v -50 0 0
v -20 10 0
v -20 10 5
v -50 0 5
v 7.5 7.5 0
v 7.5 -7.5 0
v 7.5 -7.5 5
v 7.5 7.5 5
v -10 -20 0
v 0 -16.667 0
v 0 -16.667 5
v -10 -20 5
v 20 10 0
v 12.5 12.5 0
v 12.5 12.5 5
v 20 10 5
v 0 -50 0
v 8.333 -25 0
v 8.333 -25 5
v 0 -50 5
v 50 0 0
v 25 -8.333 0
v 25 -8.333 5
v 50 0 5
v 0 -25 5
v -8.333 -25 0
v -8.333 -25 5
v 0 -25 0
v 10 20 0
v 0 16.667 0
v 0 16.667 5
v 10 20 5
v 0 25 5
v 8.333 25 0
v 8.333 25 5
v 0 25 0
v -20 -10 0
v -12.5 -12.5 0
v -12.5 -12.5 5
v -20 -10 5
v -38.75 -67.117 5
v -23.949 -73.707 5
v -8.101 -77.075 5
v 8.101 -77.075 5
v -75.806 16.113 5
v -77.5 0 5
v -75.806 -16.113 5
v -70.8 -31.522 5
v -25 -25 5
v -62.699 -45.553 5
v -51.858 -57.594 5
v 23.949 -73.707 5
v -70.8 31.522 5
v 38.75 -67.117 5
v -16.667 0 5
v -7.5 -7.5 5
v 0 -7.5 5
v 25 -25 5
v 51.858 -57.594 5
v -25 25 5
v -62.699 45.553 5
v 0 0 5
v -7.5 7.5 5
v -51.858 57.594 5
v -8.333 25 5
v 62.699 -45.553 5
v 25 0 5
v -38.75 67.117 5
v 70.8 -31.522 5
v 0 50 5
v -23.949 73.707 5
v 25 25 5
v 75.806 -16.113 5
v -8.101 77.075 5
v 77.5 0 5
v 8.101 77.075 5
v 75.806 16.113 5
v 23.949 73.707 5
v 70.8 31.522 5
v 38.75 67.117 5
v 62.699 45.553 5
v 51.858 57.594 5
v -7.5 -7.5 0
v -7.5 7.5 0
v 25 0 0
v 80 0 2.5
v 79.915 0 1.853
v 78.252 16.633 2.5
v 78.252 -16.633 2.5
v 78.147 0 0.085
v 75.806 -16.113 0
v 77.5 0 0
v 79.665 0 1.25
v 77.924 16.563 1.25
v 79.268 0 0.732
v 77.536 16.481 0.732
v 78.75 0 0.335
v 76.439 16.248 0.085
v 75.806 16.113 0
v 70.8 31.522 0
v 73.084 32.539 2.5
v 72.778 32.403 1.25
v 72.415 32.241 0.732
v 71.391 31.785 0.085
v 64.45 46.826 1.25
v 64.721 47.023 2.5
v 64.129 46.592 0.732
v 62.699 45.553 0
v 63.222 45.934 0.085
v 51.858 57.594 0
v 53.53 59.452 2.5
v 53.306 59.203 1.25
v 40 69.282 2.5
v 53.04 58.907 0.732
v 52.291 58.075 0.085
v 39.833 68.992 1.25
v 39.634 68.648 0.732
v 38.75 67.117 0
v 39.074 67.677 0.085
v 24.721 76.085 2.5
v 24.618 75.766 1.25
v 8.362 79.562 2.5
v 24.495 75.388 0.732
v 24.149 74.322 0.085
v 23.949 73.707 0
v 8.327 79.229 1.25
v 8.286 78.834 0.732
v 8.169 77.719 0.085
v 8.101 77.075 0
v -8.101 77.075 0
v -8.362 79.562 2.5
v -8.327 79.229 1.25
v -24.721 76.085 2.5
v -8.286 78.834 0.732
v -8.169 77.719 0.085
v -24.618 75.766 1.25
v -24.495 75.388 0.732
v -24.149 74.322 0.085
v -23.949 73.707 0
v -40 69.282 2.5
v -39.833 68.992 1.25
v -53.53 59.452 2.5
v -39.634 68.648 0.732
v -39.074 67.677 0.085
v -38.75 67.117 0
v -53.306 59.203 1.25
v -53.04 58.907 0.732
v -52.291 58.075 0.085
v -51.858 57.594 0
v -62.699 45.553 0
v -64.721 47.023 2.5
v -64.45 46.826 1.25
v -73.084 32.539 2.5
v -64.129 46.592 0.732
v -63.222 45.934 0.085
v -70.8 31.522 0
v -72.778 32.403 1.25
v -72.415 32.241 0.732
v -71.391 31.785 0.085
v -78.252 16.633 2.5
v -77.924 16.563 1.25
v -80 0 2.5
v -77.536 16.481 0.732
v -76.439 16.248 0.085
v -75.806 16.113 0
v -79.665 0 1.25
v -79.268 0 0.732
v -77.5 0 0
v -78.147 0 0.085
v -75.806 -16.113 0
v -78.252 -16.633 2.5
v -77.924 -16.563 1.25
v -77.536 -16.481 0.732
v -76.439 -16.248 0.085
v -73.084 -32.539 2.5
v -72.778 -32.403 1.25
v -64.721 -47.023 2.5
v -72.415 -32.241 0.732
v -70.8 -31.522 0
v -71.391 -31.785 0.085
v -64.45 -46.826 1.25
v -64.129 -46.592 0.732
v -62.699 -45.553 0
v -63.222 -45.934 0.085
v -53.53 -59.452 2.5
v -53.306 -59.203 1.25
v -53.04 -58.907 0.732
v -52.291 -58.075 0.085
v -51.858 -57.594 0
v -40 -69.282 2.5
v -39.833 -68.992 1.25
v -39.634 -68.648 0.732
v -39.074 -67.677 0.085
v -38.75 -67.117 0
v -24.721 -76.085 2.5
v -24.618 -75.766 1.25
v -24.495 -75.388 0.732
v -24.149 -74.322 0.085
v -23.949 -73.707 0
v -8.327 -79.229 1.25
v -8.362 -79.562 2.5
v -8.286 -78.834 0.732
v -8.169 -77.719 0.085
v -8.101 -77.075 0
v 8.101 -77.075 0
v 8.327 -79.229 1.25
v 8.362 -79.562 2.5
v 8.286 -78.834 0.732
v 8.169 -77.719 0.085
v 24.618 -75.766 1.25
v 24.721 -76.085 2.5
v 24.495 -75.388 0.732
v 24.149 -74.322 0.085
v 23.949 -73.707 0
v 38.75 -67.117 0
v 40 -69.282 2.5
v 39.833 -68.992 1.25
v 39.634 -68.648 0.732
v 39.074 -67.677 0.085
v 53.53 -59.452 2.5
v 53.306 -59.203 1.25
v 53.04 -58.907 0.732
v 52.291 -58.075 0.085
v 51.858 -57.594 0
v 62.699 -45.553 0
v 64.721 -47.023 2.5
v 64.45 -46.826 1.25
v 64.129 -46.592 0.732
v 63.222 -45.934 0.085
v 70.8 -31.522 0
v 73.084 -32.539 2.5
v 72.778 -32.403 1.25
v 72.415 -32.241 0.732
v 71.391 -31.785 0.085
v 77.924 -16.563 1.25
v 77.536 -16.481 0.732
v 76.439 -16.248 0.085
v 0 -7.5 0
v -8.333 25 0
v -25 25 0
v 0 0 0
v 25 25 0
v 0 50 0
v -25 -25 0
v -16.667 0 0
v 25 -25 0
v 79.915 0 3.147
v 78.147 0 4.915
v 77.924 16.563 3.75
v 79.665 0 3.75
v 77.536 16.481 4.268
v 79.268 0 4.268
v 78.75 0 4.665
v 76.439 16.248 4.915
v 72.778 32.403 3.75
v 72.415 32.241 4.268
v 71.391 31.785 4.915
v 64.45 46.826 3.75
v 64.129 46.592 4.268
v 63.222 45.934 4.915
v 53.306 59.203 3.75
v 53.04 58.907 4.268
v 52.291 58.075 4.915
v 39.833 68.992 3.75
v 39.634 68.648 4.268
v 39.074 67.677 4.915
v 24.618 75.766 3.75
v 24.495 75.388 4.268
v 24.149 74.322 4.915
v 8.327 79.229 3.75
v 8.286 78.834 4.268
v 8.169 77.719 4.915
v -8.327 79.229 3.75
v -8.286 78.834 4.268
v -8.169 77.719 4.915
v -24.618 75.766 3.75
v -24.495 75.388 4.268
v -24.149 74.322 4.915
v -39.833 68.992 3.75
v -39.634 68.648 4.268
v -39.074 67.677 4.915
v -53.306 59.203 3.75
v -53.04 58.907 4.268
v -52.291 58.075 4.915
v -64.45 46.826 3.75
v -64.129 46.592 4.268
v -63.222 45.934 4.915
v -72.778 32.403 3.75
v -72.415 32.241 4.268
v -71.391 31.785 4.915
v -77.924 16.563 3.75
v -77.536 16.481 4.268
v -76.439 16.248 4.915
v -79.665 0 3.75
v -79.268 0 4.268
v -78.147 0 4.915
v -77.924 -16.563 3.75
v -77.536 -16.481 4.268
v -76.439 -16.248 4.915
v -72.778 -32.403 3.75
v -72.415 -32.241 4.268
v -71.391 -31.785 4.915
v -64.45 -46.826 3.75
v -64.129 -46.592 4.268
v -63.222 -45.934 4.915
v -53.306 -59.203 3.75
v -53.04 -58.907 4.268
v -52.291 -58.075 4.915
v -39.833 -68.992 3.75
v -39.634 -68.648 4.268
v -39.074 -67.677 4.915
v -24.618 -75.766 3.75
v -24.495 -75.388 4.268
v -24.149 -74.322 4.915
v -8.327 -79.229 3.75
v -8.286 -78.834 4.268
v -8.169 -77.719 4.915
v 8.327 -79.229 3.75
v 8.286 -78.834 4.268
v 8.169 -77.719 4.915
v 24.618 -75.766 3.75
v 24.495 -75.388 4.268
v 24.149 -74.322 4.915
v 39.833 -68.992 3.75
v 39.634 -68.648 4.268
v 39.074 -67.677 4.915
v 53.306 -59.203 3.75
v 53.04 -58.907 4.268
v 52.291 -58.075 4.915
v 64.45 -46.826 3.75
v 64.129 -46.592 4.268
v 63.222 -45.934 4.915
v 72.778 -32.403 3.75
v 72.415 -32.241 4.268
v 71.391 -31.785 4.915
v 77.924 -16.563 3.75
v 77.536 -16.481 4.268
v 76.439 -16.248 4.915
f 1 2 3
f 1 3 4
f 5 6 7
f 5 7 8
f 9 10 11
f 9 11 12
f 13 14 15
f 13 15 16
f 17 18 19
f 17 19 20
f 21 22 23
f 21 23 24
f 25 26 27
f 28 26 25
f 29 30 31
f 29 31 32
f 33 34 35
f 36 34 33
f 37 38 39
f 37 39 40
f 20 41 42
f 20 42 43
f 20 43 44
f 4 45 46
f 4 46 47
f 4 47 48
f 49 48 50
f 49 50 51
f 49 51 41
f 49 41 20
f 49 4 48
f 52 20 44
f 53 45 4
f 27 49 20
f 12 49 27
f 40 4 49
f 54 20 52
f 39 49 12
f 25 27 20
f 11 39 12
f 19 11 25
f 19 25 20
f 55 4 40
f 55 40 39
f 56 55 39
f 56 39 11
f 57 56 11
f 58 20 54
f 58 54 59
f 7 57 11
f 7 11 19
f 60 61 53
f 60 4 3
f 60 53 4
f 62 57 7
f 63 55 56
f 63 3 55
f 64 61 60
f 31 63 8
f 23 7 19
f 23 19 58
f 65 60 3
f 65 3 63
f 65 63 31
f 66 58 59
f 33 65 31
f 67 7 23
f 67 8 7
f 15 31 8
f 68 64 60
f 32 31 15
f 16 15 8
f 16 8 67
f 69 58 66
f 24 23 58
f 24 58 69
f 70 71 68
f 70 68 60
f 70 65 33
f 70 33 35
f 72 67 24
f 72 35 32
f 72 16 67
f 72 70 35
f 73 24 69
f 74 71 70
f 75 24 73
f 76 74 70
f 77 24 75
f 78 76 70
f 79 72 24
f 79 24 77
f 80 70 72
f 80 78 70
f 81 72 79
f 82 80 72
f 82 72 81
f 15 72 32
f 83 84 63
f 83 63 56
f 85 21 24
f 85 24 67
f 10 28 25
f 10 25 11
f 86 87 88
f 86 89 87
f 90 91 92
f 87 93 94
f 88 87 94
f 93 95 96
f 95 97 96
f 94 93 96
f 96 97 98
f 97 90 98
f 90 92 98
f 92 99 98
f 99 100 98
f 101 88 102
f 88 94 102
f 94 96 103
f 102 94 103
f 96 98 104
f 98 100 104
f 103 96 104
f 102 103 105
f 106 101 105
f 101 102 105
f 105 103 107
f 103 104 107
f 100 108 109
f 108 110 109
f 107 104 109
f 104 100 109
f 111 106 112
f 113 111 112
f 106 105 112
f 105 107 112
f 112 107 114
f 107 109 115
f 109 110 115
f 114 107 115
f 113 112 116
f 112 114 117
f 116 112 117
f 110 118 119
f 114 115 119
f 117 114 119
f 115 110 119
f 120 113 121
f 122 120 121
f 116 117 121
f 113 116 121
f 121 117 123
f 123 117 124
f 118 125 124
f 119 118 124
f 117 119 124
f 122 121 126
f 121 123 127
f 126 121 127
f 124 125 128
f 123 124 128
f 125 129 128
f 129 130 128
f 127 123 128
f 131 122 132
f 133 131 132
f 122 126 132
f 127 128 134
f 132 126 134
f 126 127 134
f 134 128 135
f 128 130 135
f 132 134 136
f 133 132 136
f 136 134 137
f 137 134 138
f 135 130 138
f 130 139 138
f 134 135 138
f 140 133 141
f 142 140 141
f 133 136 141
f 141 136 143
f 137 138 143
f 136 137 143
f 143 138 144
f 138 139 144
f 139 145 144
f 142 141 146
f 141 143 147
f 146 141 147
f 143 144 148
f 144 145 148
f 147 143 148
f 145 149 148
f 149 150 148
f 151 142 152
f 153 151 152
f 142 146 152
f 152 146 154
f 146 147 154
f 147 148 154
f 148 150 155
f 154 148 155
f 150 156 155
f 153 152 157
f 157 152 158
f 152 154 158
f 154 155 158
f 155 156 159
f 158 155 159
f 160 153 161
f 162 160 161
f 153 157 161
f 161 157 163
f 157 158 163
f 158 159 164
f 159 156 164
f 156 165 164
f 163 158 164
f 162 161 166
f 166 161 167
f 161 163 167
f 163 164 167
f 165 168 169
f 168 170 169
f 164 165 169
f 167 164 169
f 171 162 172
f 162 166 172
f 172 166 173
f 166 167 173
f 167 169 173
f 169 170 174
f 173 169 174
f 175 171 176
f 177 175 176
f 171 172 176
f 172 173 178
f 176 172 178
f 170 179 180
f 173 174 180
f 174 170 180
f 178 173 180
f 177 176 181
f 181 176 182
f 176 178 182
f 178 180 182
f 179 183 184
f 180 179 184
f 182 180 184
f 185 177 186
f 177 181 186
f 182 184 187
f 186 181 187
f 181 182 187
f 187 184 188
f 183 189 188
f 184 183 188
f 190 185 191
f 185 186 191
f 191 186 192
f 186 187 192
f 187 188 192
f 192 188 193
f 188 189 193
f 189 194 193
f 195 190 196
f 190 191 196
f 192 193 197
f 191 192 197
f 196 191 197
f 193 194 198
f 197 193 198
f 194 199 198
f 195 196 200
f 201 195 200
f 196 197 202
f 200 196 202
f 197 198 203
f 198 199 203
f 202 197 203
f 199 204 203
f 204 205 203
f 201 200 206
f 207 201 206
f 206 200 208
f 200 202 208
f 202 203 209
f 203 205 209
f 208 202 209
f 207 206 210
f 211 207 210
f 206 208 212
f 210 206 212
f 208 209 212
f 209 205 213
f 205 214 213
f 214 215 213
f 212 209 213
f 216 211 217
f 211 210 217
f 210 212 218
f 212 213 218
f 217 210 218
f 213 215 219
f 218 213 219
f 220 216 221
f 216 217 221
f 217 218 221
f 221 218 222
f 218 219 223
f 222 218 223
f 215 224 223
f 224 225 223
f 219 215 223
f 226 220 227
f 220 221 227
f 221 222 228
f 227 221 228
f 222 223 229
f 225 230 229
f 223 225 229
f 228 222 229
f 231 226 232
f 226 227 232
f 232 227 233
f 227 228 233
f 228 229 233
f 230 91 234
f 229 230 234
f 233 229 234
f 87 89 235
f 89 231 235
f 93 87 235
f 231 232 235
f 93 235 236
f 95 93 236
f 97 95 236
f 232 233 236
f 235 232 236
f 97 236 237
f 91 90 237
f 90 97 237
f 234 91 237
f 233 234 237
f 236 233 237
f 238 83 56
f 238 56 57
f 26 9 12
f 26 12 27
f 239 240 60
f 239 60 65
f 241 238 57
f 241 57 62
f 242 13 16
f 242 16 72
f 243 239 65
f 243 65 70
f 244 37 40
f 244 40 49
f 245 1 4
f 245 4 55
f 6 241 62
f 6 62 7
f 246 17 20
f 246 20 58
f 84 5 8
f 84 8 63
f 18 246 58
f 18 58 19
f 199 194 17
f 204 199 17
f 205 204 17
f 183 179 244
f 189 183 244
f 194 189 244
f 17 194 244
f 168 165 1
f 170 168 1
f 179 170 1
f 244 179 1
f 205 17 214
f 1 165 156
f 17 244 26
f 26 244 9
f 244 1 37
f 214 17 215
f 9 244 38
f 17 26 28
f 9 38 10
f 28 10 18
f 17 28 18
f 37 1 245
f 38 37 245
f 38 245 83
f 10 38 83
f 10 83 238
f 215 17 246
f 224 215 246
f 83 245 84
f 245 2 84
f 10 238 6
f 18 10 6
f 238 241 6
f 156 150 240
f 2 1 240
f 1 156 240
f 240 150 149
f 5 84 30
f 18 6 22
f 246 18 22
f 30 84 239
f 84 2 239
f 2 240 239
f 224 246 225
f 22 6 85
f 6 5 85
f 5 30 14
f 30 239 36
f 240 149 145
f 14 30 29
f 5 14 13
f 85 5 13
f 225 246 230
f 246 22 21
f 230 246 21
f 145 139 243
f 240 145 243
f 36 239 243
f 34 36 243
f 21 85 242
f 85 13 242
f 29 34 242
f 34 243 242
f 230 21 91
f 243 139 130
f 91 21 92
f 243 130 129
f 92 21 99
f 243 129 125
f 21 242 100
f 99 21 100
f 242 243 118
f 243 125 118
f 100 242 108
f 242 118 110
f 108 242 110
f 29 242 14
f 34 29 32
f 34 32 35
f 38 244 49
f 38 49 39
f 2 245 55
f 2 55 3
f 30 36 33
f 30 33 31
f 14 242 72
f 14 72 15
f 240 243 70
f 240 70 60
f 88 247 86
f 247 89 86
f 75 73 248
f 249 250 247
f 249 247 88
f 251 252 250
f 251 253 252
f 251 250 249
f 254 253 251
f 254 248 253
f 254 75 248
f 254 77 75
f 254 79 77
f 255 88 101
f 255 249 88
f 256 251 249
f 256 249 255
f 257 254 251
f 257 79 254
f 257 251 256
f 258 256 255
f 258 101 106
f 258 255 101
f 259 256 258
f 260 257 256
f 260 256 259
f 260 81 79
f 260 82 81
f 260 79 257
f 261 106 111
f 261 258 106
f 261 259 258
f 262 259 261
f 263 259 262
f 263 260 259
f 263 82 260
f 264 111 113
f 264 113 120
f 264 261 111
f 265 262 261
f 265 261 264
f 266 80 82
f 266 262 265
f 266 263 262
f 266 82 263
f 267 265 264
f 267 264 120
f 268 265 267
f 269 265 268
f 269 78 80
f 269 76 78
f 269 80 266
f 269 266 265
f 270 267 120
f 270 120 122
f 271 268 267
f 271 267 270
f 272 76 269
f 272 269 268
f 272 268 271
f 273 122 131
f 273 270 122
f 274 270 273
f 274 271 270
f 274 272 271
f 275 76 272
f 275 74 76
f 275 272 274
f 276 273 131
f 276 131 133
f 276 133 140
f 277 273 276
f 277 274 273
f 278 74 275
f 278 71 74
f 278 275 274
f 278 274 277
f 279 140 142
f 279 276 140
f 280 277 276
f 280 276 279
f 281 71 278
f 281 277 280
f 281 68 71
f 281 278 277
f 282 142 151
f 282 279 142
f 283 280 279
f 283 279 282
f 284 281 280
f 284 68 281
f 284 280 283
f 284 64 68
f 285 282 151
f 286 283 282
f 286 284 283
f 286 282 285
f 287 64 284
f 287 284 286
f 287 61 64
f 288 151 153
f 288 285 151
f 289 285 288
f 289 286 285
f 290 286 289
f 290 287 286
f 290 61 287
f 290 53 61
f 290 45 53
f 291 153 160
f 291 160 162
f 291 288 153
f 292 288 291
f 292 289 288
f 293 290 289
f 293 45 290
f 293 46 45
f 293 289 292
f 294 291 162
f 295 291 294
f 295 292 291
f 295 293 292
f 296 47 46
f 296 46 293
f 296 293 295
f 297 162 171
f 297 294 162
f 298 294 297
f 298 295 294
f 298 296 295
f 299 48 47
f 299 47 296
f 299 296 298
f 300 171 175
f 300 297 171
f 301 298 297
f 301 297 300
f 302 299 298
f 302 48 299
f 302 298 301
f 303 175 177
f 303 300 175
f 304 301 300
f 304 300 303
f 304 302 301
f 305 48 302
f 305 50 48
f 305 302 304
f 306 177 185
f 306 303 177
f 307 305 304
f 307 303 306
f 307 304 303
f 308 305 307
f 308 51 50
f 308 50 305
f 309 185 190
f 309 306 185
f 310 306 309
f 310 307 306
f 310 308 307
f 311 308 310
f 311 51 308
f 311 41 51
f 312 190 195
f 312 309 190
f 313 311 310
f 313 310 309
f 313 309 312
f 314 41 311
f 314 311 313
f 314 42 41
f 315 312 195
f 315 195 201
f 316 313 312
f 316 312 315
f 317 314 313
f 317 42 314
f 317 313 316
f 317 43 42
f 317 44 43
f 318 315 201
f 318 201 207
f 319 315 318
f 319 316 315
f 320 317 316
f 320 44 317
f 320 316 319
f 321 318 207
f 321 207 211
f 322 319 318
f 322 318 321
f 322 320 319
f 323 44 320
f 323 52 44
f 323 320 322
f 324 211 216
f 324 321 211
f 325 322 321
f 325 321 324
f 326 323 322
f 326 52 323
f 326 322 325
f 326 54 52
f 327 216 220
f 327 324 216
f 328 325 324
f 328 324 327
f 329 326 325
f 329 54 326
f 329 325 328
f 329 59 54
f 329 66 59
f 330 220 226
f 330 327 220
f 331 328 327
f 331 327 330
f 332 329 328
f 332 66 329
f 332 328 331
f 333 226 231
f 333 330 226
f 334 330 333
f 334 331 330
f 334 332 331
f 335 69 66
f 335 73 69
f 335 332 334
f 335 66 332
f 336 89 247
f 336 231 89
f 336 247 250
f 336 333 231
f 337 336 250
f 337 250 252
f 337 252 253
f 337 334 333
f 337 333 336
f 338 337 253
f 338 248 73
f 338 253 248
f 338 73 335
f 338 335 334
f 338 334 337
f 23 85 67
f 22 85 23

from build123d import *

# Parameters (mm, degrees)
F0_R     = 80
F1_DEPTH = 5
F3_DEPTH = 10
F4_R     = 2.49999
F5_DEPTH = 25


# Not quite as in the source:
# - a fillet or chamfer is up to 0.001 mm smaller than in the source, because OpenCascade refuses the exact size


with BuildPart() as f1:
    # F0 (on Top) → F1 (new body)
    with BuildSketch(Plane.XY):
        Circle(F0_R)
    extrude(amount=F1_DEPTH)

    # F2 (on Top) → F3 (cut)
    with BuildSketch(Plane.XY):
        Polygon((0, 50), (-25, 25), (-8.3333333333, 25), align=None)
        Polygon((-50, 0), (-16.6666666667, 0), (-20, 10), align=None)
        Polygon((-25, -25), (-12.5, -12.5), (-20, -10), align=None)
        Polygon((0, -25), (0, -16.6666666667), (-10, -20), (-8.3333333333, -25), align=None)
        Polygon((0, -50), (25, -25), (8.3333333333, -25), align=None)
        Polygon((0, 25), (0, 16.6666666667), (10, 20), (8.3333333333, 25), align=None)
        Polygon((25, 25), (12.5, 12.5), (20, 10), align=None)
        Polygon((50, 0), (25, 0), (25, -8.3333333333), align=None)
    extrude(amount=F3_DEPTH, mode=Mode.SUBTRACT)

    # F4 (radius 2.5 in the source; OpenCascade refuses exactly that, so slightly less here)
    f4_edges = [f1.edges().sort_by_distance(p)[0] for p in [
        (-80, 0, 0),
        (-80, 0, 5),
    ]]
    fillet(f4_edges, radius=F4_R)

    # F2 (on Top) → F5 (cut)
    with BuildSketch(Plane.XY):
        Polygon((0, -7.5), (0, 0), (-7.5, -7.5), align=None)
        Polygon((-7.5, -7.5), (0, 0), (-7.5, 0), align=None)
        Polygon((-7.5, 0), (0, 0), (-7.5, 7.5), align=None)
        Polygon((-7.5, 7.5), (0, 0), (0, 7.5), align=None)
        Polygon((0, 7.5), (0, 0), (7.5, 7.5), align=None)
        Polygon((7.5, 7.5), (0, 0), (7.5, 0), align=None)
        Polygon((7.5, 0), (0, 0), (7.5, -7.5), align=None)
    extrude(amount=F5_DEPTH, mode=Mode.SUBTRACT)


solid = f1.part
